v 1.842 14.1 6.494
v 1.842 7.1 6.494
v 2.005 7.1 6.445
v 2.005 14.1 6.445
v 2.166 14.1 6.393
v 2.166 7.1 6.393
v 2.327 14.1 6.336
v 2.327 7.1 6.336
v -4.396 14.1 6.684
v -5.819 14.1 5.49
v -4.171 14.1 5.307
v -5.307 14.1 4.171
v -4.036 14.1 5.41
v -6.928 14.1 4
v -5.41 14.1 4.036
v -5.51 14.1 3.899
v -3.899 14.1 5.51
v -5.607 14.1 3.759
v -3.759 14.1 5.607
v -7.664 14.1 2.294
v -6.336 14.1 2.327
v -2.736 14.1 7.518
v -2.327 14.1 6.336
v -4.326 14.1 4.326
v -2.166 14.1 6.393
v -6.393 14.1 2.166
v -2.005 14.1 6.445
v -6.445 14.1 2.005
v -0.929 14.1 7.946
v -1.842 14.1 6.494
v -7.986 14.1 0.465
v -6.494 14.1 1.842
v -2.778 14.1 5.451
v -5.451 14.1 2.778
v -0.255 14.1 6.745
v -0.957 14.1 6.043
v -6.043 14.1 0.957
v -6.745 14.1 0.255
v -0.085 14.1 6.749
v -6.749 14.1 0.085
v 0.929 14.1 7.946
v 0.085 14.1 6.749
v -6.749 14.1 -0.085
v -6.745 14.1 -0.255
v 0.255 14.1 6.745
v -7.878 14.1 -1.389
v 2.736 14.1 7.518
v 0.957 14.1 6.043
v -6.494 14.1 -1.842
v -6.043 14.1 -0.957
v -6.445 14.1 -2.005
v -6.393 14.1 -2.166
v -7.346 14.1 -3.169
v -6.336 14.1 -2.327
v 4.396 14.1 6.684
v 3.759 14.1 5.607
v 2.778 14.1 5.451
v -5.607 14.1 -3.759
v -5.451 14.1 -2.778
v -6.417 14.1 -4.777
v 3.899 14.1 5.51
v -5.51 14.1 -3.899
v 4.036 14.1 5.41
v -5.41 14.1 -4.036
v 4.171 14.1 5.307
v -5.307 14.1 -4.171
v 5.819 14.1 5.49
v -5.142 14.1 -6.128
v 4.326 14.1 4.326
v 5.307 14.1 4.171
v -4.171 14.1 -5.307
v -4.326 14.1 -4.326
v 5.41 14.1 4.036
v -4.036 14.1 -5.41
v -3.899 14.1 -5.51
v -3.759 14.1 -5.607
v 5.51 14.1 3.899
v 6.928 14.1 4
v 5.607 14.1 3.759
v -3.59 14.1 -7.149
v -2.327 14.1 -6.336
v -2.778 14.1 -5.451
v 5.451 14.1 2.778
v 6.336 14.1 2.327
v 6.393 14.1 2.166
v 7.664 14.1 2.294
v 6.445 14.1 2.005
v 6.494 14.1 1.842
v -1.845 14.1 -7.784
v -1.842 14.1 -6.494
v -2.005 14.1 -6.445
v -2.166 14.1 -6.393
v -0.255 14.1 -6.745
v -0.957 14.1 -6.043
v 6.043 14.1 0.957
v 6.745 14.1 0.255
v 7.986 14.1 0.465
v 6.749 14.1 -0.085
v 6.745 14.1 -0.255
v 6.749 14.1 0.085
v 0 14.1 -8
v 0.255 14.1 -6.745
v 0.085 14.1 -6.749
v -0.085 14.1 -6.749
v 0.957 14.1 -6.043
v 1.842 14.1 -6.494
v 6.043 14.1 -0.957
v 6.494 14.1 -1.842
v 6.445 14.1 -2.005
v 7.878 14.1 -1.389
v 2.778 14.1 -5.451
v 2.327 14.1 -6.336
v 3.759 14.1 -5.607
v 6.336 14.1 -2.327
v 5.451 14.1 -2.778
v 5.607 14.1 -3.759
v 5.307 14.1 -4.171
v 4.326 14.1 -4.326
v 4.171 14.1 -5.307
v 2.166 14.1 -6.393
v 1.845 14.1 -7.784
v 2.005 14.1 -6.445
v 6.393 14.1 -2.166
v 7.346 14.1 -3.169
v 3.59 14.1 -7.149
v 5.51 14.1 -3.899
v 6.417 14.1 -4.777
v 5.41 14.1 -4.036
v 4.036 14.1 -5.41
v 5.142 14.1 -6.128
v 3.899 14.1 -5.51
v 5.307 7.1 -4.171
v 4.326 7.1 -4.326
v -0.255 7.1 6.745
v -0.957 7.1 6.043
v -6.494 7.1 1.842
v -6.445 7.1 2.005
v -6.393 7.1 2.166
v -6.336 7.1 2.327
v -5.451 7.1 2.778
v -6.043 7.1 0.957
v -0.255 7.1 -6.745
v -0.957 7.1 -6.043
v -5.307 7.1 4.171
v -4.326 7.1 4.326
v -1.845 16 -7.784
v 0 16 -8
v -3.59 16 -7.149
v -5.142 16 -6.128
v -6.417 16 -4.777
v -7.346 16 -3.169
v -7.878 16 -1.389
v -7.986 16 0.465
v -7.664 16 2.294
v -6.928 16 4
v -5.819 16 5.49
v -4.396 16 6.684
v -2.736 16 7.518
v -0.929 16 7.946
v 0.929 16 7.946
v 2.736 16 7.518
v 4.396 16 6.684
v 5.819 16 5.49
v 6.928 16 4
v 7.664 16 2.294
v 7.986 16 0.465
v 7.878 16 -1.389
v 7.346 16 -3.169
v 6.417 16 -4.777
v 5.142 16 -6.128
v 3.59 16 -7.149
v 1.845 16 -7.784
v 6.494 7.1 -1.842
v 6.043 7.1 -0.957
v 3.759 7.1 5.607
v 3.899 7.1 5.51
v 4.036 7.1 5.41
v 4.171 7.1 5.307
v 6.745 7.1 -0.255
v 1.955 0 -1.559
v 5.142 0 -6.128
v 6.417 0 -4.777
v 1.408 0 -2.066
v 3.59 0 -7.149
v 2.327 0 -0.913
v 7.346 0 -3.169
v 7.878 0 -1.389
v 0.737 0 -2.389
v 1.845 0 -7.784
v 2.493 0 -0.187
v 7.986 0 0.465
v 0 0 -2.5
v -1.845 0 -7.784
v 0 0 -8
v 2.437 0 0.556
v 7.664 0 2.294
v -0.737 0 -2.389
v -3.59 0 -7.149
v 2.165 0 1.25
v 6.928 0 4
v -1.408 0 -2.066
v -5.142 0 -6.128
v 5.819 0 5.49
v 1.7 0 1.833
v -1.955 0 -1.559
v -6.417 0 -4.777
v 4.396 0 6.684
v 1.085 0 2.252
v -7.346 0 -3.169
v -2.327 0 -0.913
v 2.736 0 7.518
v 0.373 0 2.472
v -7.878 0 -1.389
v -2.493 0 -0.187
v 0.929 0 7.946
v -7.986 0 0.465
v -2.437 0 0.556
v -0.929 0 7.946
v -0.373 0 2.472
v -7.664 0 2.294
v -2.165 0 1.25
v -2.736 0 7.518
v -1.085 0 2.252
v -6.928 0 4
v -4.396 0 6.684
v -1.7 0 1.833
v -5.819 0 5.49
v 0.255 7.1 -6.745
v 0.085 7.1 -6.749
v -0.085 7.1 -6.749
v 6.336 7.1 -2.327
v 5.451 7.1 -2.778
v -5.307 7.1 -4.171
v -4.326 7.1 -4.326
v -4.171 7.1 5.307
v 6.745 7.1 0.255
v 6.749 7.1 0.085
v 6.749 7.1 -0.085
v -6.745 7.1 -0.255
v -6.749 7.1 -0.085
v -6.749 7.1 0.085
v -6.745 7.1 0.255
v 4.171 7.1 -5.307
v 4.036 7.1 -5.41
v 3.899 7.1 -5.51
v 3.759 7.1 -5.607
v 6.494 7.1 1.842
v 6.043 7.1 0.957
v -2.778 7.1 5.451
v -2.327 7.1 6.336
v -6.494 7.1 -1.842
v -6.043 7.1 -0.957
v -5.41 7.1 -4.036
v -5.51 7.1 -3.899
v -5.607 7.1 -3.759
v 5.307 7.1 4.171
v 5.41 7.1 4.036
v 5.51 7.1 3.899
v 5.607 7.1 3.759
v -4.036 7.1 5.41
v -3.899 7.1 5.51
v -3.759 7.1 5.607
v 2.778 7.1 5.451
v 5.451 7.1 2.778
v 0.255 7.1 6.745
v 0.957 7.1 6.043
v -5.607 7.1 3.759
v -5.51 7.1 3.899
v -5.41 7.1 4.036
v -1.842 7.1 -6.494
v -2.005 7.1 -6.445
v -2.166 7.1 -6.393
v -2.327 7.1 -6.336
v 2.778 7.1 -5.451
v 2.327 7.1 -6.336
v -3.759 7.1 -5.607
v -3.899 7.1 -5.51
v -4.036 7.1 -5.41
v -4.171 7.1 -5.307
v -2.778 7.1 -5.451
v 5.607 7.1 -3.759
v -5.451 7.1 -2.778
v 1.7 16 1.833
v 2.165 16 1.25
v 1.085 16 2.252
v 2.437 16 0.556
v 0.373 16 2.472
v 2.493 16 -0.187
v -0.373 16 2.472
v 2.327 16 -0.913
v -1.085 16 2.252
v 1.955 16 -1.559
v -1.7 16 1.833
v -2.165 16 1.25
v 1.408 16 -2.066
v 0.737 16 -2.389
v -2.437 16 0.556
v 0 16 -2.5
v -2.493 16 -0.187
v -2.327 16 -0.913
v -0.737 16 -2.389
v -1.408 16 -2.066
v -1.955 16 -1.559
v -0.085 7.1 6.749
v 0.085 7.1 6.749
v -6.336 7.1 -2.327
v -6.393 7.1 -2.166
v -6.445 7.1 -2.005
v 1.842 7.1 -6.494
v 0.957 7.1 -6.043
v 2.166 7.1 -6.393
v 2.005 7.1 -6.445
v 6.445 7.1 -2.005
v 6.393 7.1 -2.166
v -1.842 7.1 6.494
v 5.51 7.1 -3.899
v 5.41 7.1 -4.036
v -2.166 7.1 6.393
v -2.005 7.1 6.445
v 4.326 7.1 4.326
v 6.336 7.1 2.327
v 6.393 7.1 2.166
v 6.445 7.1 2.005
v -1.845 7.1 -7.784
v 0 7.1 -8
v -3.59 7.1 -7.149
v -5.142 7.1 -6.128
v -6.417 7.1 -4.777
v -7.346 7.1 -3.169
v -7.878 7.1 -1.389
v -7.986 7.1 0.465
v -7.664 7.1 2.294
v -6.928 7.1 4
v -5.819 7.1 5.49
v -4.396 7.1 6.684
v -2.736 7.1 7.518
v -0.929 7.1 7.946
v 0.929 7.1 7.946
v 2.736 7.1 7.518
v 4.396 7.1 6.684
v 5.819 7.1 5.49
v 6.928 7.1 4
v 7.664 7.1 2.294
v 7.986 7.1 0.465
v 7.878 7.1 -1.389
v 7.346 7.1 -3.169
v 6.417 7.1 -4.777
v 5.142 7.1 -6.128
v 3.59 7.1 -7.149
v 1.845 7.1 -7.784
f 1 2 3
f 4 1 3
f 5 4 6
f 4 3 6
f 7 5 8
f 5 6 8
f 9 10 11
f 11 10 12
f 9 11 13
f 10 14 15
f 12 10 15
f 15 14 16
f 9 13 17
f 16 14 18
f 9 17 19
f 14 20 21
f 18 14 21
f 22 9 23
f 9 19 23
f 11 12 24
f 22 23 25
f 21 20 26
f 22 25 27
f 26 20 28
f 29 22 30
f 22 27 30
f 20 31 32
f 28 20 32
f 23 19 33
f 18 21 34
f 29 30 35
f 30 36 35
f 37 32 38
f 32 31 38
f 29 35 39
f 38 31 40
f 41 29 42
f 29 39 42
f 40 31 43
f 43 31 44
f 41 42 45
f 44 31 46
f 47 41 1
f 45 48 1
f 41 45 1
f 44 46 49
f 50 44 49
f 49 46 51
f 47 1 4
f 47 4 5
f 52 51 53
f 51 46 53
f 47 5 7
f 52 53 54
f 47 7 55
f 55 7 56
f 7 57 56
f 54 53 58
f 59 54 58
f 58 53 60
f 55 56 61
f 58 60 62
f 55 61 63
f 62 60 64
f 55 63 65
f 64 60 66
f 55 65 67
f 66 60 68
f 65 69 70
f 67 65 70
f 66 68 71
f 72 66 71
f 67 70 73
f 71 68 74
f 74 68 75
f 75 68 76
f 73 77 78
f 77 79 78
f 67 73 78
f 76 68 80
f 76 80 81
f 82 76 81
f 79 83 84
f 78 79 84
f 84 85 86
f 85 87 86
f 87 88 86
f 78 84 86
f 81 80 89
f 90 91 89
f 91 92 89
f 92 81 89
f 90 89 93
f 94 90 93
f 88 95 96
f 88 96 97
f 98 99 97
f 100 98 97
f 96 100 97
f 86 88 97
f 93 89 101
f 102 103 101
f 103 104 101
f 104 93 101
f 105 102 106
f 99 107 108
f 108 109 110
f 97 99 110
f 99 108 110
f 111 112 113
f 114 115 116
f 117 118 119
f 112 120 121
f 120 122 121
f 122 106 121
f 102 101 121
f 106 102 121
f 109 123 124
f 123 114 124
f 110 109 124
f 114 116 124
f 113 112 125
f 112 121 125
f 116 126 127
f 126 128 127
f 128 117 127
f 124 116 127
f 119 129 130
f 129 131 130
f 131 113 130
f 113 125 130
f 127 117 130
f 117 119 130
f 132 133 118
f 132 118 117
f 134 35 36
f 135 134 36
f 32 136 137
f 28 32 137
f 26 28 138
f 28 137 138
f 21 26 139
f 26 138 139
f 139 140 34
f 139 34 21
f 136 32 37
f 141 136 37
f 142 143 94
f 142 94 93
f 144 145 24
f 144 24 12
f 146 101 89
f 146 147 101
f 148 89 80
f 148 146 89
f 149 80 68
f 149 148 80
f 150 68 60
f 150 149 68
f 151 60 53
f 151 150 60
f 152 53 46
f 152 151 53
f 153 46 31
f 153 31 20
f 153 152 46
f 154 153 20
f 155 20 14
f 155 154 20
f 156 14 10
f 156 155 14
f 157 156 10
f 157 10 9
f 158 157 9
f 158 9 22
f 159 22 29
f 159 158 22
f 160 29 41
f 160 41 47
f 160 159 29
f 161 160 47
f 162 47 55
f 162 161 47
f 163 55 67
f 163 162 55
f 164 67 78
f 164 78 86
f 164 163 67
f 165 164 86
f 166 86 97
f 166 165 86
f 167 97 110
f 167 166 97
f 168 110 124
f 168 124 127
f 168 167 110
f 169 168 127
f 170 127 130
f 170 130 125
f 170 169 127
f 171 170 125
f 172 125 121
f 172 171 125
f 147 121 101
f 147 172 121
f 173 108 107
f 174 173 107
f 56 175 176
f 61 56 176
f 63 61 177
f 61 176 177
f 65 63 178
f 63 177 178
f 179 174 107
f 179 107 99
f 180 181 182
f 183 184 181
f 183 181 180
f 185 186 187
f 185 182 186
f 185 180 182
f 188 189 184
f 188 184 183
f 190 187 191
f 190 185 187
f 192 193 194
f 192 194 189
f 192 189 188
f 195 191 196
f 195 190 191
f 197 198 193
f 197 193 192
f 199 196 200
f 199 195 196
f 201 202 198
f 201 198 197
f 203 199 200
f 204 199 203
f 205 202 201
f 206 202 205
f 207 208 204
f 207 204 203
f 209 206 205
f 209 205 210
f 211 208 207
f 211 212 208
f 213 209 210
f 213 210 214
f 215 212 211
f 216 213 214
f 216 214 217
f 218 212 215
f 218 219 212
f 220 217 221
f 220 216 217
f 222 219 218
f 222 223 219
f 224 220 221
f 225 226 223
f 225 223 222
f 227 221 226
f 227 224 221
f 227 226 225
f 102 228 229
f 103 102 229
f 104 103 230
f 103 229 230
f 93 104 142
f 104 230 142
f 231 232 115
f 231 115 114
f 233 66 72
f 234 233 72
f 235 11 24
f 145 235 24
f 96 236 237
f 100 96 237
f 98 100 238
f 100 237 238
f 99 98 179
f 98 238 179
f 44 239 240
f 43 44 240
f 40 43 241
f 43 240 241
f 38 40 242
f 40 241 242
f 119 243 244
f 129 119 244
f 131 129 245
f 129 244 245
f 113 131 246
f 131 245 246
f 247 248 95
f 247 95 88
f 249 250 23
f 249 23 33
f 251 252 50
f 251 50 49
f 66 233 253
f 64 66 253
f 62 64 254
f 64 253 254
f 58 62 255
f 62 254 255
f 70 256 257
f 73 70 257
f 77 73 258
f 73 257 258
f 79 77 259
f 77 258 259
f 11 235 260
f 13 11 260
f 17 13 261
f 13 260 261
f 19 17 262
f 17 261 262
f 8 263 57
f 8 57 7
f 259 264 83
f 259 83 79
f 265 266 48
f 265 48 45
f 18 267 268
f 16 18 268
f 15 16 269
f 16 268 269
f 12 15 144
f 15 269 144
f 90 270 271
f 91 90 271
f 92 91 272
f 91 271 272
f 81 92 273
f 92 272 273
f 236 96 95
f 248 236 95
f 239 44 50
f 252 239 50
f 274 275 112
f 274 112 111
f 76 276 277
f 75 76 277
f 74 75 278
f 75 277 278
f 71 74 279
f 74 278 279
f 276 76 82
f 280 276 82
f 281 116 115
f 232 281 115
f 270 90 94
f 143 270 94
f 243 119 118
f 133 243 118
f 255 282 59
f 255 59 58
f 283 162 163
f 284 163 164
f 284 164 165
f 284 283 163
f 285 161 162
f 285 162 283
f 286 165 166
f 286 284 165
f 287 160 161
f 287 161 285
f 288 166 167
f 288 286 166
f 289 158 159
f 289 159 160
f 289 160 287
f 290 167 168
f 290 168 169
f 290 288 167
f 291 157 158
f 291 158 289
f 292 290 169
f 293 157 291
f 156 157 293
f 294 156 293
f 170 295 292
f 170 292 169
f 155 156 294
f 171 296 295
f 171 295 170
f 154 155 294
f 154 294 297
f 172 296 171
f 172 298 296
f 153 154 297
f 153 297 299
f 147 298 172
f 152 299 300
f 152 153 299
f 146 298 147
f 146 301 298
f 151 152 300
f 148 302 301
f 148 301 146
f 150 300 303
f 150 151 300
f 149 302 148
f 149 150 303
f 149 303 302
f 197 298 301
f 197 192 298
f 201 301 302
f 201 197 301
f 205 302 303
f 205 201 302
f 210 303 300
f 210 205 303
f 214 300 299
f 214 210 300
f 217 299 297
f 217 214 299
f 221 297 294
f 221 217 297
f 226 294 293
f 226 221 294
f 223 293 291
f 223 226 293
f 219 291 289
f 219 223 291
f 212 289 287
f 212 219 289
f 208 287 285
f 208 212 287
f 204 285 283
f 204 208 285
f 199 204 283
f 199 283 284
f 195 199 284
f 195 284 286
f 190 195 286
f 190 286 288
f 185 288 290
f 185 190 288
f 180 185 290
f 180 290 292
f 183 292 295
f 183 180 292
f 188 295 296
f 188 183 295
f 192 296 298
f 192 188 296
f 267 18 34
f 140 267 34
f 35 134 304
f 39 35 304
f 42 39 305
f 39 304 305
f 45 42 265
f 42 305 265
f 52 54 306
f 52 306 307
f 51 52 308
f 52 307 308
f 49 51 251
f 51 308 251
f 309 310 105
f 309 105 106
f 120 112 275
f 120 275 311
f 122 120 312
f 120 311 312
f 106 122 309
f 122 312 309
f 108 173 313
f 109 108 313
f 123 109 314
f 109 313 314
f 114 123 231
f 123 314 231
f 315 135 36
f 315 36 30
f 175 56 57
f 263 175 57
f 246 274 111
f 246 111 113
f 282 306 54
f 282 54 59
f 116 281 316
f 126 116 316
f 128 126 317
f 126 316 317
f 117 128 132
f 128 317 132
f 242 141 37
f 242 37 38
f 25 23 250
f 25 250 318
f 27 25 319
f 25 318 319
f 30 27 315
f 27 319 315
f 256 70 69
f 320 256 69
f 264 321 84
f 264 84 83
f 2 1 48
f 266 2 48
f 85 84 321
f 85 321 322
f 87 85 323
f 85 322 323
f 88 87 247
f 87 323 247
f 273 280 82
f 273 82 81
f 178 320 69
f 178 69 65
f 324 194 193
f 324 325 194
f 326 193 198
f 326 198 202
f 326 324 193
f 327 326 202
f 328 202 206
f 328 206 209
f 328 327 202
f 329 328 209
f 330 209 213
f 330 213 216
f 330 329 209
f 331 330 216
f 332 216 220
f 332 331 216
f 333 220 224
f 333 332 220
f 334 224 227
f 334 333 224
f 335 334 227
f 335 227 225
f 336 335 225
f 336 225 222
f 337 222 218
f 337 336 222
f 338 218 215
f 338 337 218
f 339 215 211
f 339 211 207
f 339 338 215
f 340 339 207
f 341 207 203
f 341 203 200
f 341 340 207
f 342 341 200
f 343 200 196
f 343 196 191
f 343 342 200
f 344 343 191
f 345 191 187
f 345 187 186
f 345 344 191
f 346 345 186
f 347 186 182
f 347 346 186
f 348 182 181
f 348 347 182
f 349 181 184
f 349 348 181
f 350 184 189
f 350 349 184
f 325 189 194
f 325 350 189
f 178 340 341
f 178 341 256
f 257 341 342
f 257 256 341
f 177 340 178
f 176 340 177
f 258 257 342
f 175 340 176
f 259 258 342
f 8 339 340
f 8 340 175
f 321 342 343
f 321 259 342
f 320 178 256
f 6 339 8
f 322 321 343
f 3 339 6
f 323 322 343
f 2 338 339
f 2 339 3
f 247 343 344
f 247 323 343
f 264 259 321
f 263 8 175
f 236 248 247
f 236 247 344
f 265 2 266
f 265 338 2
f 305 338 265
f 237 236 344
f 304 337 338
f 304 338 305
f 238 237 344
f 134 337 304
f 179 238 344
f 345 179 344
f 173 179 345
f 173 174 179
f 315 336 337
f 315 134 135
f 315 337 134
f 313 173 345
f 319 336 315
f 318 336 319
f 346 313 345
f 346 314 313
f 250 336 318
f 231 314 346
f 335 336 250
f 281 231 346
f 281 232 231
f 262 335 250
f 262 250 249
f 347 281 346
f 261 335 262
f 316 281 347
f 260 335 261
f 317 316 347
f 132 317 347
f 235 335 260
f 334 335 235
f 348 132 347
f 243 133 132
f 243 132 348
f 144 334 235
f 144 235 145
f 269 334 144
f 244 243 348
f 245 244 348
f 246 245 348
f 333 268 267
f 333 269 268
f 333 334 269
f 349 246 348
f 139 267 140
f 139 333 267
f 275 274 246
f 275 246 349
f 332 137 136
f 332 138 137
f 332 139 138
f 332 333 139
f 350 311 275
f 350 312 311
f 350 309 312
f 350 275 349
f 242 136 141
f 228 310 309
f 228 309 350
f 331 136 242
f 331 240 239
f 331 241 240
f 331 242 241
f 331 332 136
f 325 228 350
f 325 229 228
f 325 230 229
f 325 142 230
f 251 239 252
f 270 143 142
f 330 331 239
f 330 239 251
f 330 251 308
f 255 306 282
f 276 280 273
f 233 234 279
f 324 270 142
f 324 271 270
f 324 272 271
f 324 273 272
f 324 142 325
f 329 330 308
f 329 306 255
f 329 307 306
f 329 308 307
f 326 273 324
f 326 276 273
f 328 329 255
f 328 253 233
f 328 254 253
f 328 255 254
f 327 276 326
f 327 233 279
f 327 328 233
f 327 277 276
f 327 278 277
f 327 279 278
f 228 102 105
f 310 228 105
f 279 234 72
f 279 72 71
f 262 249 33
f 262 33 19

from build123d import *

# Parameters (mm, degrees)
BOSS_EXTRUDE1_DEPTH = 7
CIRPATTERN1_COUNT   = 20
SKETCH4_R           = 7.5
SKETCH4_R_2         = 6.75
CUT_EXTRUDE1_DEPTH  = 7


with BuildPart() as part:
    # Sketch2 → Revolve1 (revolve)
    with BuildSketch(Plane.XY, mode=Mode.PRIVATE) as revolve1_sk:
        Polygon((-2.5, 0), (-8, 0), (-8, 7.1), (-6.11, 7.1), (-6.11, 14.1), (-8, 14.1), (-8, 16), (-2.5, 16), align=None)
    revolve(revolve1_sk.sketch.rotate(Axis((0, 0, 0), (0, 1, 0)), 270), axis=Axis((0, 0, 0), (0, 1, 0)))

    # Sketch3 → Boss-Extrude1 (add)
    with BuildSketch(Plane(origin=(0, 7.1, 0), x_dir=(1, 0, 0), z_dir=(0, 1, 0))):
        Polygon((-6, 1), (-6, -1), (-7, 0), align=None)
    boss_extrude1 = extrude(amount=BOSS_EXTRUDE1_DEPTH)

    # CirPattern1: Boss-Extrude1 ×20 about axis
    cirpattern1_axis = Axis((0, 0, 0), (0, 1, 0))
    for i in range(1, CIRPATTERN1_COUNT):
        add(boss_extrude1.rotate(cirpattern1_axis, i * 360 / CIRPATTERN1_COUNT))

    # Sketch4 → Cut-Extrude1 (cut)
    with BuildSketch(Plane(origin=(0, 7.1, 0), x_dir=(1, 0, 0), z_dir=(0, 1, 0))):
        Circle(SKETCH4_R)
        Circle(SKETCH4_R_2, mode=Mode.SUBTRACT)
    extrude(amount=CUT_EXTRUDE1_DEPTH, mode=Mode.SUBTRACT)


solid = part.part
